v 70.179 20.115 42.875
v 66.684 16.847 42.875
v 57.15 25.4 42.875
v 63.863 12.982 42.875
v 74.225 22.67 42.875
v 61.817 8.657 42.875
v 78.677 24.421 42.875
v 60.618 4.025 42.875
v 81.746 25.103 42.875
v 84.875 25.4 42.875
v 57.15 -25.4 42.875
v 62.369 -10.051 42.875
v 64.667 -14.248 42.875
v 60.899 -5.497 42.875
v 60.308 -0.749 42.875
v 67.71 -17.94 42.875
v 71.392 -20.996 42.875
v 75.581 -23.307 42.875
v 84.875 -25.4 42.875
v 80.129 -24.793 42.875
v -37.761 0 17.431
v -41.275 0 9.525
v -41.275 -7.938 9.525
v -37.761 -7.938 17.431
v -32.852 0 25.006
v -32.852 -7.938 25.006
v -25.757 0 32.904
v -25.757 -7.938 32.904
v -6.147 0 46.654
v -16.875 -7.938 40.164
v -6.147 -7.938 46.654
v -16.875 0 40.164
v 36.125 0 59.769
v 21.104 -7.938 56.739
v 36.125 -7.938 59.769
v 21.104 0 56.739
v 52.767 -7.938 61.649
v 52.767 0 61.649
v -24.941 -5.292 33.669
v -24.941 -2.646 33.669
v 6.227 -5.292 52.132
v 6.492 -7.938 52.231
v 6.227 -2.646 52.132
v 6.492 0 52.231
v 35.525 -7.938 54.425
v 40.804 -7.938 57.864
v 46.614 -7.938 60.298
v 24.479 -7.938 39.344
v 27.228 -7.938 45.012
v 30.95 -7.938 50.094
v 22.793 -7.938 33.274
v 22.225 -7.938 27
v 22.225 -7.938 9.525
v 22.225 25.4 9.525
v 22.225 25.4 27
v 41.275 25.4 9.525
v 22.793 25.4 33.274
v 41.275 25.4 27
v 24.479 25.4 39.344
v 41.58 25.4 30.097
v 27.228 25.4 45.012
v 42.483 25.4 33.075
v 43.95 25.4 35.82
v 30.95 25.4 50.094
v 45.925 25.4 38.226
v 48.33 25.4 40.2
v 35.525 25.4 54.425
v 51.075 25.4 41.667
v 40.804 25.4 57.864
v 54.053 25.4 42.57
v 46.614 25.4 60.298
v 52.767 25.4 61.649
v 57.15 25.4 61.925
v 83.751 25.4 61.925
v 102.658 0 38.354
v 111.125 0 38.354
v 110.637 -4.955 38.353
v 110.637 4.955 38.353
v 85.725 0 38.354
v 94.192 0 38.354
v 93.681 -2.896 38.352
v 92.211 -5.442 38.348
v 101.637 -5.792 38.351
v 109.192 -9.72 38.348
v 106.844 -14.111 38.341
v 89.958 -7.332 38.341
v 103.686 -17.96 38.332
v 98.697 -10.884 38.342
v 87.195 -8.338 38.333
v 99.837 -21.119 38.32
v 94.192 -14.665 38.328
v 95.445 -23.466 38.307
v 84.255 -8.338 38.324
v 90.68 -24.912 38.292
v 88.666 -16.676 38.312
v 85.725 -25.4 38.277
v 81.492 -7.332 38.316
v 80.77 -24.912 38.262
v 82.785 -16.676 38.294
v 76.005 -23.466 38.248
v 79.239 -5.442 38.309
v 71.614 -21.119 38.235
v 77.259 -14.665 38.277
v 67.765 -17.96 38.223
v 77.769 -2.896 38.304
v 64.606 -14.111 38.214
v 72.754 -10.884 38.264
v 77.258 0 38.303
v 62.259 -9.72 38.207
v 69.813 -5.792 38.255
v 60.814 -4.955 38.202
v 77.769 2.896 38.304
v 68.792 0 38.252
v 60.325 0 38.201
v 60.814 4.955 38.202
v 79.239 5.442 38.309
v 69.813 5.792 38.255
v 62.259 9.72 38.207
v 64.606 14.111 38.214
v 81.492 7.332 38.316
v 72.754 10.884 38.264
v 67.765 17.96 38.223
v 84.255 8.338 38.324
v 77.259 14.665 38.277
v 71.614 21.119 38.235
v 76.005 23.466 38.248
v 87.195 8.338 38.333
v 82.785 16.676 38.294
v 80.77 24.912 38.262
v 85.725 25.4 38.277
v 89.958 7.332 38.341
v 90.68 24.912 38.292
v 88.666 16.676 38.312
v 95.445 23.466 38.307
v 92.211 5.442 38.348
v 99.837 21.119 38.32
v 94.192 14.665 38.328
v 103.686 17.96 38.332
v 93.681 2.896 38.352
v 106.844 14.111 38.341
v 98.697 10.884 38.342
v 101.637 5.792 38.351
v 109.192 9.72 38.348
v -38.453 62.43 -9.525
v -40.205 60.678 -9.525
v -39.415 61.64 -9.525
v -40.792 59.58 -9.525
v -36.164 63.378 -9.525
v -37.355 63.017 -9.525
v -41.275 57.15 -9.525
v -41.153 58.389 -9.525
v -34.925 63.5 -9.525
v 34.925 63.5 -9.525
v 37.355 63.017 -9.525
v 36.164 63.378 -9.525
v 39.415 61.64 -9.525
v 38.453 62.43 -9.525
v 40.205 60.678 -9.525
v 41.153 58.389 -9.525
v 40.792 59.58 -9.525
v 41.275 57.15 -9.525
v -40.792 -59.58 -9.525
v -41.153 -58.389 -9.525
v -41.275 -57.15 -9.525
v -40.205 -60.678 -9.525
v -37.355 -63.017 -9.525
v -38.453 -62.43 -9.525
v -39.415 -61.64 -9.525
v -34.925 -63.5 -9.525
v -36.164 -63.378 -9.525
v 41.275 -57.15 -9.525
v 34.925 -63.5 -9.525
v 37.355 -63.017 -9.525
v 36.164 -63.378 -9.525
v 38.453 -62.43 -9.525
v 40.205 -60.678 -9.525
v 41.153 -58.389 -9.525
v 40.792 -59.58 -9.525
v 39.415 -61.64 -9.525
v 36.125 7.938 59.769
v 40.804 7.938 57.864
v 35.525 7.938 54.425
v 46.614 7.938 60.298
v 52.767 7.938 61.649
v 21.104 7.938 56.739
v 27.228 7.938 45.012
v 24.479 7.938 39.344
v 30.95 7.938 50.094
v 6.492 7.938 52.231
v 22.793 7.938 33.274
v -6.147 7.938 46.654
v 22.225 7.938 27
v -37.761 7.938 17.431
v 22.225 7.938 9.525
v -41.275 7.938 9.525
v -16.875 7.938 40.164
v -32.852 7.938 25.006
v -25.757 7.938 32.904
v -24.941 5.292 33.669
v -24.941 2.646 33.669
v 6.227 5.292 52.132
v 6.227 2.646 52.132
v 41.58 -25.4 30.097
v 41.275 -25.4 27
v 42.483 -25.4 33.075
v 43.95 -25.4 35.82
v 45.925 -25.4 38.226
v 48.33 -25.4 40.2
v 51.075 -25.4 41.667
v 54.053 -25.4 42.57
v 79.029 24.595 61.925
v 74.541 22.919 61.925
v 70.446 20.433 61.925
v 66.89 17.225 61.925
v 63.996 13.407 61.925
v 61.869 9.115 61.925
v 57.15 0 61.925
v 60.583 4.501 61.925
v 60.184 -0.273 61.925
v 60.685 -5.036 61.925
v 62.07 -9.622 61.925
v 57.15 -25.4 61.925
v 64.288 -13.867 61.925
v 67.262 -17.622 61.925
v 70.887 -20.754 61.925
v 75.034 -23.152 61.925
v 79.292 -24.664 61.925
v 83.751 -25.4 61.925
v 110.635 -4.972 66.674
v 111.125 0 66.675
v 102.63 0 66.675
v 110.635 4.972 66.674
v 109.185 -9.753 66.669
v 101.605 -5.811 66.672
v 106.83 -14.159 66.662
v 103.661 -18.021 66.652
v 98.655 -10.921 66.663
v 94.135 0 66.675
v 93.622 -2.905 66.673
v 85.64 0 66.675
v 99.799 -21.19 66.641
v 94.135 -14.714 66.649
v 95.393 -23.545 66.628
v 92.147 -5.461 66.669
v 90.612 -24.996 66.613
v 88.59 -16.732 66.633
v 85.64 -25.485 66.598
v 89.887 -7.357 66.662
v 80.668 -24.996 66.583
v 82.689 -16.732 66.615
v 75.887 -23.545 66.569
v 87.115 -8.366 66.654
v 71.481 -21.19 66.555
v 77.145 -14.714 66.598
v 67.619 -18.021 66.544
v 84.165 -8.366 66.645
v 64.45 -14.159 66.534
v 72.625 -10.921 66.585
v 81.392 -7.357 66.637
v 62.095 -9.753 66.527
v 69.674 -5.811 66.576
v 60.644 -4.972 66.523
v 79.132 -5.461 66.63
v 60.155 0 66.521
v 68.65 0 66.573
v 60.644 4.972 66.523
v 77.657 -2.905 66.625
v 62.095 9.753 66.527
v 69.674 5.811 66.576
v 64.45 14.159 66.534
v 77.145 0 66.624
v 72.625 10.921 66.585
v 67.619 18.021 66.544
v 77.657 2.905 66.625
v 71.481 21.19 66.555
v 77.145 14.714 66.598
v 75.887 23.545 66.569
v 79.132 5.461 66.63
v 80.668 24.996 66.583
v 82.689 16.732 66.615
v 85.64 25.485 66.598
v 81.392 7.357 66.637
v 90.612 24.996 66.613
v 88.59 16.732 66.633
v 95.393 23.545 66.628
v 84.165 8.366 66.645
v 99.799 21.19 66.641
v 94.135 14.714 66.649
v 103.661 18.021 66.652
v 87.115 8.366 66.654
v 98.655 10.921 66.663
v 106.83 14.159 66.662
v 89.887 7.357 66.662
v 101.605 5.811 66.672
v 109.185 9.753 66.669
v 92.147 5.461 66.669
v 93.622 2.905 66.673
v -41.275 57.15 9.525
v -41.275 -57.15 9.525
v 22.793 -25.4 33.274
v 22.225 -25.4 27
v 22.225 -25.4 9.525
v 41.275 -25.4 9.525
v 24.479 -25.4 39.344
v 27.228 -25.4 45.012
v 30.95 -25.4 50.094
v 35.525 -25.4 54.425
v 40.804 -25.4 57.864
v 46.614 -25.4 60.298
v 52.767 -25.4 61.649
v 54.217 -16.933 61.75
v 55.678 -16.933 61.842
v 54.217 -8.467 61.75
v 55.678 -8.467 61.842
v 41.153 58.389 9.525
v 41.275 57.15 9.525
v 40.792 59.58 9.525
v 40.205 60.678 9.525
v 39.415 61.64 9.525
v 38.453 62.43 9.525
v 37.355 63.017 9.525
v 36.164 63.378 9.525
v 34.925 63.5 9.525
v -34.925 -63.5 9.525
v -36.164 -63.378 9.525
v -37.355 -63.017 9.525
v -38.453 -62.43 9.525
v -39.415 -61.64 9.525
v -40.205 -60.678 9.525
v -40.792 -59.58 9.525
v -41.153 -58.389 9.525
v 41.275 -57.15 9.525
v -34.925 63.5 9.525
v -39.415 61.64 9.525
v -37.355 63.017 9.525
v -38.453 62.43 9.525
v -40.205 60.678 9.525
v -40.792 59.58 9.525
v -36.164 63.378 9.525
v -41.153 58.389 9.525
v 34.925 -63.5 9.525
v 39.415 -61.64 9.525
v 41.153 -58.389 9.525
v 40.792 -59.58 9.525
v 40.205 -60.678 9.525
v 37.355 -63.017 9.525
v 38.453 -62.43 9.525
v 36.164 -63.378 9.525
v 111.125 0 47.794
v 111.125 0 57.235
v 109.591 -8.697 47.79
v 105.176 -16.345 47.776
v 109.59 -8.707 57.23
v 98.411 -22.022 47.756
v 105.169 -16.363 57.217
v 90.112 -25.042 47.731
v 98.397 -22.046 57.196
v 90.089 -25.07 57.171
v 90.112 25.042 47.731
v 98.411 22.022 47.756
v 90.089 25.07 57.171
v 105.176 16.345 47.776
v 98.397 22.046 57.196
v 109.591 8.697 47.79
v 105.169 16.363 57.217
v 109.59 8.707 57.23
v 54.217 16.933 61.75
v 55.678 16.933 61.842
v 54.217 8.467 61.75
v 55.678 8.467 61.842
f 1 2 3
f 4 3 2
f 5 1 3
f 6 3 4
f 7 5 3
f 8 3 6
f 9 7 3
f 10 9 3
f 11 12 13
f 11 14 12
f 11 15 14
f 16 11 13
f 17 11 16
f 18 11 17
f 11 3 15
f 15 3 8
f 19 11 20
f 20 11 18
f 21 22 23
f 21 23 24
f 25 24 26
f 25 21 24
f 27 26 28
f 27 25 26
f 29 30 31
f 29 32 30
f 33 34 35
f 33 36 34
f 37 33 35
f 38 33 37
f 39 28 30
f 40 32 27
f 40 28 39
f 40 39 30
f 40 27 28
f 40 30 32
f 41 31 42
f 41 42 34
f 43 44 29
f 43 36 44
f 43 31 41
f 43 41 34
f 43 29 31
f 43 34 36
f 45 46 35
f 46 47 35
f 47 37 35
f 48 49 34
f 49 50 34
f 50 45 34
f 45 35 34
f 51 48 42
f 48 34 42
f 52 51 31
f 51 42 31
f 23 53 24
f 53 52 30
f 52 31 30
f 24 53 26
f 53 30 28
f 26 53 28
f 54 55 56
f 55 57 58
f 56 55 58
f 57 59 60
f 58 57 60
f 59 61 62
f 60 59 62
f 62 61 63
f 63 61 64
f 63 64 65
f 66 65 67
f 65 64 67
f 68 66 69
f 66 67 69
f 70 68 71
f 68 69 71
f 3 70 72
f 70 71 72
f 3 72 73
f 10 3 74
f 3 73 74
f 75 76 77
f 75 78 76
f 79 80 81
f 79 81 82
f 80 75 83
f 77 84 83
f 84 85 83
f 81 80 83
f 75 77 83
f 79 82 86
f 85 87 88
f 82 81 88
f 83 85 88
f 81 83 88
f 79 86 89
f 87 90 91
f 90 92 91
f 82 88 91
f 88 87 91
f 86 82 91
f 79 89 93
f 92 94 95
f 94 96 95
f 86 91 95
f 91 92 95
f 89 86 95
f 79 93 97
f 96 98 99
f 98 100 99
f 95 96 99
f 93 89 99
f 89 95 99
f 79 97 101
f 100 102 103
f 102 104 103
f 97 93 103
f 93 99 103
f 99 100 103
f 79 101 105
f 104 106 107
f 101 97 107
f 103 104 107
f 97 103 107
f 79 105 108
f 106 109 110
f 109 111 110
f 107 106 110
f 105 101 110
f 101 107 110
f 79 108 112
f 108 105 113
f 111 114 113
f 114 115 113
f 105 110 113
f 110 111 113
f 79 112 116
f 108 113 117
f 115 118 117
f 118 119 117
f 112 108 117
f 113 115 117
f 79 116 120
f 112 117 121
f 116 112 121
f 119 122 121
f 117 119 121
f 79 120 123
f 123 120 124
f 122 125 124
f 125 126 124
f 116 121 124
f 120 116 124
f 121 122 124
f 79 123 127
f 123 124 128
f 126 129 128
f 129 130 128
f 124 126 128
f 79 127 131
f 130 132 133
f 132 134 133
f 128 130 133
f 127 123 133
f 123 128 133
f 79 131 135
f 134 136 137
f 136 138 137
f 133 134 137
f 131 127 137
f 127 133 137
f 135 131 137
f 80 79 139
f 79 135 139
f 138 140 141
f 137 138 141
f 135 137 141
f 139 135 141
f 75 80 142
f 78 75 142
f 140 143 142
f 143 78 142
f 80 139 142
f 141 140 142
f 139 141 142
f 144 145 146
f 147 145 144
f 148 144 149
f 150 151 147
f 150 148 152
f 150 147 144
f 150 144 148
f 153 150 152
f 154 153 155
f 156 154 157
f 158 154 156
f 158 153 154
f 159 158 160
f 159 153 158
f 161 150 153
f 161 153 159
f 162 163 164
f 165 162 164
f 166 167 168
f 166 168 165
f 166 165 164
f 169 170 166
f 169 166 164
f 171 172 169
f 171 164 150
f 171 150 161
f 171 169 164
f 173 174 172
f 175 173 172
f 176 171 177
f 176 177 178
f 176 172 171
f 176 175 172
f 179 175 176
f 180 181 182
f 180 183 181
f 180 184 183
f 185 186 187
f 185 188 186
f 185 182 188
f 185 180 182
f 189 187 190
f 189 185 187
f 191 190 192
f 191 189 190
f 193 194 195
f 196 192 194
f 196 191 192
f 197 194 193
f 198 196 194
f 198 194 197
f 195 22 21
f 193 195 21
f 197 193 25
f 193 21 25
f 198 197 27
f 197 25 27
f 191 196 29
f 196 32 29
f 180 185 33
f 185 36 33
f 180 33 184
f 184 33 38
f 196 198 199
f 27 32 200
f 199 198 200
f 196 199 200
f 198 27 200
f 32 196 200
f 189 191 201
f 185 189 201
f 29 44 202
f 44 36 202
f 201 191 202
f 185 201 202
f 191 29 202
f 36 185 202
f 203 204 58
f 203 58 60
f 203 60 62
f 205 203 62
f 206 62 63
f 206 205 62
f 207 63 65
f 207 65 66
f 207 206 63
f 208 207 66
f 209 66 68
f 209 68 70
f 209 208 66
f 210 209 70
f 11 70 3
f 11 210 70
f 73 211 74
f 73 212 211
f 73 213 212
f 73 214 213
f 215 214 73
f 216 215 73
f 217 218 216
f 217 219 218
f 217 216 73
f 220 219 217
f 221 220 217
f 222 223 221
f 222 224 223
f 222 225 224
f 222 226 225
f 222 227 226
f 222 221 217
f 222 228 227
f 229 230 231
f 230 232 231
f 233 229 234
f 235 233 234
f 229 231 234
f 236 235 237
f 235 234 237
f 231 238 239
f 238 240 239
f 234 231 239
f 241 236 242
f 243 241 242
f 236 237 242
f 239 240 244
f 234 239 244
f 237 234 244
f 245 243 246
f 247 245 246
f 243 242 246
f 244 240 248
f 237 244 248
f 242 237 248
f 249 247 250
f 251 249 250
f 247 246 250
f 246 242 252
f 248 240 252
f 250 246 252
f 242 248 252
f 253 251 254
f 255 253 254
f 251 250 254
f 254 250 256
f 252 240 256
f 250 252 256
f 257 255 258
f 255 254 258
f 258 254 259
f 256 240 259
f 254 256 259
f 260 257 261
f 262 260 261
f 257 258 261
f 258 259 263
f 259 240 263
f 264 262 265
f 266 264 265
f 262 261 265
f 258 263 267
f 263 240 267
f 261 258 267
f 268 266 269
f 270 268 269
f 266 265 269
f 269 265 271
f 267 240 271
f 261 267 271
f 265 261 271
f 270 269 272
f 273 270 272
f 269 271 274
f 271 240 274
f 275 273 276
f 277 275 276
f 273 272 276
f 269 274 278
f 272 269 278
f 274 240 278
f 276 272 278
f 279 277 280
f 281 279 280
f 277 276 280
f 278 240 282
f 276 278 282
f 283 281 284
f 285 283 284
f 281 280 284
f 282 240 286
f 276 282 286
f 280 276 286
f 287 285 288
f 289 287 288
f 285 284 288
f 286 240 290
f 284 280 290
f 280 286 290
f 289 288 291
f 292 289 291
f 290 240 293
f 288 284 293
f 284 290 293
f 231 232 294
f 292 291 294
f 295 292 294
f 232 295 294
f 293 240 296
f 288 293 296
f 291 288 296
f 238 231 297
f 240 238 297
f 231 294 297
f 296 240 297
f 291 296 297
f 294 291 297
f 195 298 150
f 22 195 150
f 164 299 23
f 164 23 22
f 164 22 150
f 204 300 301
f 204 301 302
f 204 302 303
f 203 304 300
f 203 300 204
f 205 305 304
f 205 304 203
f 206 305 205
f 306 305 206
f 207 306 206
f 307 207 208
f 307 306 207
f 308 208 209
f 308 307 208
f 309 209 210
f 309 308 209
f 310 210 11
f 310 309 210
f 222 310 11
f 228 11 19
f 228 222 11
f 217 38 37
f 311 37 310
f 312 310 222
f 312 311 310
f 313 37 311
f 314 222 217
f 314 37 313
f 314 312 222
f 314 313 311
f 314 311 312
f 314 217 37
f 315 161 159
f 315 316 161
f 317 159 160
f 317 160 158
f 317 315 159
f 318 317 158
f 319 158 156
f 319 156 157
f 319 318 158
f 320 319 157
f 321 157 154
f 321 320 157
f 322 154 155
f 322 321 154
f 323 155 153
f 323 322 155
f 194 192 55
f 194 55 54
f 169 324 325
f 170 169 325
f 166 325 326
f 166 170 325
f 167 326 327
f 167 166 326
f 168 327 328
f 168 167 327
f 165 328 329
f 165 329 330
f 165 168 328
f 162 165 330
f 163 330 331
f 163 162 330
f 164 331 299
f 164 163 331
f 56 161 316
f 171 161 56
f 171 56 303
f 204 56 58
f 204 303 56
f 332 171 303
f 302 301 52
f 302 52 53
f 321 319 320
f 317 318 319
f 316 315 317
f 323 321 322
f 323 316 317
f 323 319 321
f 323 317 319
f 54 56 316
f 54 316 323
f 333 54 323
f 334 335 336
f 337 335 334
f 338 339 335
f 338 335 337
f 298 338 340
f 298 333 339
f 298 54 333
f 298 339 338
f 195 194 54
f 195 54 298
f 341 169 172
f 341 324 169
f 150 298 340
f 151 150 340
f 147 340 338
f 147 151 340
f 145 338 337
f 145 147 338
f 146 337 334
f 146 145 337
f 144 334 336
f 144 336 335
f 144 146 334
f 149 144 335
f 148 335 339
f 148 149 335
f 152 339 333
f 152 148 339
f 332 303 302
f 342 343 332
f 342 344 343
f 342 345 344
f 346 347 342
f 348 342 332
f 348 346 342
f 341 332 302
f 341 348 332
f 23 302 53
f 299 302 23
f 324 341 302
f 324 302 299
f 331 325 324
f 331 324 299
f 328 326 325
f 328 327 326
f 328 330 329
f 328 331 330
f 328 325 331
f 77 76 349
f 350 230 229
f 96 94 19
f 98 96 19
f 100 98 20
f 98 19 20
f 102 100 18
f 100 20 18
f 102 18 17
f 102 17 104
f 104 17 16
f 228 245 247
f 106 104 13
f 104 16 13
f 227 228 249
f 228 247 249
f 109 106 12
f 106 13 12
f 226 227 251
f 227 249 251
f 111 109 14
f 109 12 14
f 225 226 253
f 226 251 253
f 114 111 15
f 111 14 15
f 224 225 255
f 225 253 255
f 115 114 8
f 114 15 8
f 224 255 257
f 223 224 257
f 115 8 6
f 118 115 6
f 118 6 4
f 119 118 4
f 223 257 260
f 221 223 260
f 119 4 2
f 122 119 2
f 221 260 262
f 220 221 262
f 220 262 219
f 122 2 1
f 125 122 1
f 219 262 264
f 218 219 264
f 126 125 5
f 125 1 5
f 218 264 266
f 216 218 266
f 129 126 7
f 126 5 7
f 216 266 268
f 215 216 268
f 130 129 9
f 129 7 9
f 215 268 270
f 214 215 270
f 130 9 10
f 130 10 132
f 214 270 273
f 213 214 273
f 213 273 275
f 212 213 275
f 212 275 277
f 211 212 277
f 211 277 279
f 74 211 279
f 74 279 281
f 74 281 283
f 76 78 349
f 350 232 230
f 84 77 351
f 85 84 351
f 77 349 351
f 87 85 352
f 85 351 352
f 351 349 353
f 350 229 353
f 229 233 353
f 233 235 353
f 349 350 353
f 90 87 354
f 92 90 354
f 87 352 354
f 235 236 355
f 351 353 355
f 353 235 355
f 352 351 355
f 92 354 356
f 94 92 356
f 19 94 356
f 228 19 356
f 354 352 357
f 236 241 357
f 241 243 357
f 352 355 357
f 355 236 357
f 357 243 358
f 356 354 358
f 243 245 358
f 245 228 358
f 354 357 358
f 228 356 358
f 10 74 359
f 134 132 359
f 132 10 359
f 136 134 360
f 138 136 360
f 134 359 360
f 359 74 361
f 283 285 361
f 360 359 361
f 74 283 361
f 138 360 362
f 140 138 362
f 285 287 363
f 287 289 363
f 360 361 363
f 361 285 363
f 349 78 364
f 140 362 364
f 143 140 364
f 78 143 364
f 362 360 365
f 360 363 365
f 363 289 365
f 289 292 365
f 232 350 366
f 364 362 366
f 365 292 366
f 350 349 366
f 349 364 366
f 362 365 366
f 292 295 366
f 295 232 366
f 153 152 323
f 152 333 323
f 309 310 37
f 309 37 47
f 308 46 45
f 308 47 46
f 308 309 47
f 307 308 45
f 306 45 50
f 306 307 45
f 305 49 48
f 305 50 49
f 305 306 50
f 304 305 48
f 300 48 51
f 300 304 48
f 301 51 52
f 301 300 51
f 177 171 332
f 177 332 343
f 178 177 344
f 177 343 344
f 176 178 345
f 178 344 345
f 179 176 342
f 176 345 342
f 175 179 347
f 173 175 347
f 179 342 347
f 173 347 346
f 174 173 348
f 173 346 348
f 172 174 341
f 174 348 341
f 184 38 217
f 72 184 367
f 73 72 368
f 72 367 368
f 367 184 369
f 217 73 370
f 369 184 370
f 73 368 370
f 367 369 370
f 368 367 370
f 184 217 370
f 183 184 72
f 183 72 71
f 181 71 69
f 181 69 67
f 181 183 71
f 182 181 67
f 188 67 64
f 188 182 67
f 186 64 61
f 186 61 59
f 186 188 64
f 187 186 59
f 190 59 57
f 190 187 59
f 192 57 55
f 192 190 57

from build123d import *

# Parameters (mm, degrees)
F1_DEPTH = 63.5
F2_DEPTH = 25.4
F3_DEPTH = 7.9375
F0_W     = 3.175
F0_H     = 19.05
F0_W_2   = 25.3145909364
F5_DEPTH = 25.4
F7_R     = 6.35


with BuildPart() as f1:
    # F0 (on Front) → F1 (new body, symmetric)
    with BuildSketch(Plane.XZ):
        Polygon((-41.275, -9.525), (41.275, -9.525), (41.275, 9.525), (22.225, 9.525), (-41.275, 9.525), align=None)
    extrude(amount=F1_DEPTH, both=True)

    # F0 (on Front) → F2 (join, symmetric)
    with BuildSketch(Plane.XZ):
        with BuildLine():
            Line((22.225, 9.525), (41.275, 9.525))
            Line((41.275, 9.525), (41.275, 27.0002))
            ThreePointArc((41.275, 27.0002), (45.9246798487, 38.2255201513), (57.15, 42.8752))
            Line((57.15, 42.8752), (57.15, 61.9252))
            add(Edge.make_bspline(
                [(52.766737565, 61.6490475339), (54.2109947937, 61.7540958796), (55.6720672383, 61.8462382858), (57.15, 61.9252)],
                knots=[108.6209629864, 108.6209629864, 108.6209629864, 108.6209629864, 111.5045361635, 111.5045361635, 111.5045361635, 111.5045361635], degree=3))
            ThreePointArc((52.766737565, 61.6490475339), (30.9503715146, 50.0942488488), (22.225, 27.0002))
            Line((22.225, 27.0002), (22.225, 9.525))
        make_face()
    extrude(amount=F2_DEPTH, both=True)

    # F0 (on Front) → F3 (join, symmetric)
    with BuildSketch(Plane.XZ):
        with BuildLine():
            add(Edge.make_bspline(
                [(-41.275, 9.525), (-32.1805033195, 35.4221321522), (-1.6368101652, 57.6919943344), (52.766737565, 61.6490475339)],
                knots=[0, 0, 0, 0, 108.6209629864, 108.6209629864, 108.6209629864, 108.6209629864], degree=3))
            Line((-41.275, 9.525), (22.225, 9.525))
            Line((22.225, 9.525), (22.225, 27.0002))
            ThreePointArc((22.225, 27.0002), (30.9503715146, 50.0942488488), (52.766737565, 61.6490475339))
        make_face()
    extrude(amount=F3_DEPTH, both=True)



with BuildPart() as f4:
    # F0 (on Front) → F4 (revolve)
    with BuildSketch(Plane.XZ):
        Polygon((85.6395909364, 66.675), (85.725, 38.354), (111.125, 38.354), (111.125, 66.675), align=None)
    revolve(axis=Axis((85.6822954682, 0, 52.5145), (0.0030157366, 0, -0.9999954527)))


with BuildPart() as f1_1:
    add(f1.part)

    add(f4.part)  # F5 merges F4
    # F0 (on Front) → F5 (join, symmetric)
    with BuildSketch(Plane.XZ):
        with Locations((58.7375, 52.4002)):
            Rectangle(F0_W, F0_H)
        with Locations((72.9822954682, 52.4002)):
            Rectangle(F0_W_2, F0_H)
    extrude(amount=F5_DEPTH, both=True)

    # F0 (on Front) → F6 (revolve)
    with BuildSketch(Plane.XZ):
        Polygon((85.6395909364, 66.675), (85.725, 38.354), (111.125, 38.354), (111.125, 66.675), align=None)
    revolve(axis=Axis((85.6822954682, 0, 52.5145), (0.0030157366, 0, -0.9999954527)))

    # F7
    f7_edges = [f1_1.edges().sort_by_distance(p)[0] for p in [
        (-41.275, -63.5, 0),
        (41.275, -63.5, 0),
        (41.275, 63.5, 0),
        (-41.275, 63.5, 0),
    ]]
    fillet(f7_edges, radius=F7_R)


solid = f1_1.part
